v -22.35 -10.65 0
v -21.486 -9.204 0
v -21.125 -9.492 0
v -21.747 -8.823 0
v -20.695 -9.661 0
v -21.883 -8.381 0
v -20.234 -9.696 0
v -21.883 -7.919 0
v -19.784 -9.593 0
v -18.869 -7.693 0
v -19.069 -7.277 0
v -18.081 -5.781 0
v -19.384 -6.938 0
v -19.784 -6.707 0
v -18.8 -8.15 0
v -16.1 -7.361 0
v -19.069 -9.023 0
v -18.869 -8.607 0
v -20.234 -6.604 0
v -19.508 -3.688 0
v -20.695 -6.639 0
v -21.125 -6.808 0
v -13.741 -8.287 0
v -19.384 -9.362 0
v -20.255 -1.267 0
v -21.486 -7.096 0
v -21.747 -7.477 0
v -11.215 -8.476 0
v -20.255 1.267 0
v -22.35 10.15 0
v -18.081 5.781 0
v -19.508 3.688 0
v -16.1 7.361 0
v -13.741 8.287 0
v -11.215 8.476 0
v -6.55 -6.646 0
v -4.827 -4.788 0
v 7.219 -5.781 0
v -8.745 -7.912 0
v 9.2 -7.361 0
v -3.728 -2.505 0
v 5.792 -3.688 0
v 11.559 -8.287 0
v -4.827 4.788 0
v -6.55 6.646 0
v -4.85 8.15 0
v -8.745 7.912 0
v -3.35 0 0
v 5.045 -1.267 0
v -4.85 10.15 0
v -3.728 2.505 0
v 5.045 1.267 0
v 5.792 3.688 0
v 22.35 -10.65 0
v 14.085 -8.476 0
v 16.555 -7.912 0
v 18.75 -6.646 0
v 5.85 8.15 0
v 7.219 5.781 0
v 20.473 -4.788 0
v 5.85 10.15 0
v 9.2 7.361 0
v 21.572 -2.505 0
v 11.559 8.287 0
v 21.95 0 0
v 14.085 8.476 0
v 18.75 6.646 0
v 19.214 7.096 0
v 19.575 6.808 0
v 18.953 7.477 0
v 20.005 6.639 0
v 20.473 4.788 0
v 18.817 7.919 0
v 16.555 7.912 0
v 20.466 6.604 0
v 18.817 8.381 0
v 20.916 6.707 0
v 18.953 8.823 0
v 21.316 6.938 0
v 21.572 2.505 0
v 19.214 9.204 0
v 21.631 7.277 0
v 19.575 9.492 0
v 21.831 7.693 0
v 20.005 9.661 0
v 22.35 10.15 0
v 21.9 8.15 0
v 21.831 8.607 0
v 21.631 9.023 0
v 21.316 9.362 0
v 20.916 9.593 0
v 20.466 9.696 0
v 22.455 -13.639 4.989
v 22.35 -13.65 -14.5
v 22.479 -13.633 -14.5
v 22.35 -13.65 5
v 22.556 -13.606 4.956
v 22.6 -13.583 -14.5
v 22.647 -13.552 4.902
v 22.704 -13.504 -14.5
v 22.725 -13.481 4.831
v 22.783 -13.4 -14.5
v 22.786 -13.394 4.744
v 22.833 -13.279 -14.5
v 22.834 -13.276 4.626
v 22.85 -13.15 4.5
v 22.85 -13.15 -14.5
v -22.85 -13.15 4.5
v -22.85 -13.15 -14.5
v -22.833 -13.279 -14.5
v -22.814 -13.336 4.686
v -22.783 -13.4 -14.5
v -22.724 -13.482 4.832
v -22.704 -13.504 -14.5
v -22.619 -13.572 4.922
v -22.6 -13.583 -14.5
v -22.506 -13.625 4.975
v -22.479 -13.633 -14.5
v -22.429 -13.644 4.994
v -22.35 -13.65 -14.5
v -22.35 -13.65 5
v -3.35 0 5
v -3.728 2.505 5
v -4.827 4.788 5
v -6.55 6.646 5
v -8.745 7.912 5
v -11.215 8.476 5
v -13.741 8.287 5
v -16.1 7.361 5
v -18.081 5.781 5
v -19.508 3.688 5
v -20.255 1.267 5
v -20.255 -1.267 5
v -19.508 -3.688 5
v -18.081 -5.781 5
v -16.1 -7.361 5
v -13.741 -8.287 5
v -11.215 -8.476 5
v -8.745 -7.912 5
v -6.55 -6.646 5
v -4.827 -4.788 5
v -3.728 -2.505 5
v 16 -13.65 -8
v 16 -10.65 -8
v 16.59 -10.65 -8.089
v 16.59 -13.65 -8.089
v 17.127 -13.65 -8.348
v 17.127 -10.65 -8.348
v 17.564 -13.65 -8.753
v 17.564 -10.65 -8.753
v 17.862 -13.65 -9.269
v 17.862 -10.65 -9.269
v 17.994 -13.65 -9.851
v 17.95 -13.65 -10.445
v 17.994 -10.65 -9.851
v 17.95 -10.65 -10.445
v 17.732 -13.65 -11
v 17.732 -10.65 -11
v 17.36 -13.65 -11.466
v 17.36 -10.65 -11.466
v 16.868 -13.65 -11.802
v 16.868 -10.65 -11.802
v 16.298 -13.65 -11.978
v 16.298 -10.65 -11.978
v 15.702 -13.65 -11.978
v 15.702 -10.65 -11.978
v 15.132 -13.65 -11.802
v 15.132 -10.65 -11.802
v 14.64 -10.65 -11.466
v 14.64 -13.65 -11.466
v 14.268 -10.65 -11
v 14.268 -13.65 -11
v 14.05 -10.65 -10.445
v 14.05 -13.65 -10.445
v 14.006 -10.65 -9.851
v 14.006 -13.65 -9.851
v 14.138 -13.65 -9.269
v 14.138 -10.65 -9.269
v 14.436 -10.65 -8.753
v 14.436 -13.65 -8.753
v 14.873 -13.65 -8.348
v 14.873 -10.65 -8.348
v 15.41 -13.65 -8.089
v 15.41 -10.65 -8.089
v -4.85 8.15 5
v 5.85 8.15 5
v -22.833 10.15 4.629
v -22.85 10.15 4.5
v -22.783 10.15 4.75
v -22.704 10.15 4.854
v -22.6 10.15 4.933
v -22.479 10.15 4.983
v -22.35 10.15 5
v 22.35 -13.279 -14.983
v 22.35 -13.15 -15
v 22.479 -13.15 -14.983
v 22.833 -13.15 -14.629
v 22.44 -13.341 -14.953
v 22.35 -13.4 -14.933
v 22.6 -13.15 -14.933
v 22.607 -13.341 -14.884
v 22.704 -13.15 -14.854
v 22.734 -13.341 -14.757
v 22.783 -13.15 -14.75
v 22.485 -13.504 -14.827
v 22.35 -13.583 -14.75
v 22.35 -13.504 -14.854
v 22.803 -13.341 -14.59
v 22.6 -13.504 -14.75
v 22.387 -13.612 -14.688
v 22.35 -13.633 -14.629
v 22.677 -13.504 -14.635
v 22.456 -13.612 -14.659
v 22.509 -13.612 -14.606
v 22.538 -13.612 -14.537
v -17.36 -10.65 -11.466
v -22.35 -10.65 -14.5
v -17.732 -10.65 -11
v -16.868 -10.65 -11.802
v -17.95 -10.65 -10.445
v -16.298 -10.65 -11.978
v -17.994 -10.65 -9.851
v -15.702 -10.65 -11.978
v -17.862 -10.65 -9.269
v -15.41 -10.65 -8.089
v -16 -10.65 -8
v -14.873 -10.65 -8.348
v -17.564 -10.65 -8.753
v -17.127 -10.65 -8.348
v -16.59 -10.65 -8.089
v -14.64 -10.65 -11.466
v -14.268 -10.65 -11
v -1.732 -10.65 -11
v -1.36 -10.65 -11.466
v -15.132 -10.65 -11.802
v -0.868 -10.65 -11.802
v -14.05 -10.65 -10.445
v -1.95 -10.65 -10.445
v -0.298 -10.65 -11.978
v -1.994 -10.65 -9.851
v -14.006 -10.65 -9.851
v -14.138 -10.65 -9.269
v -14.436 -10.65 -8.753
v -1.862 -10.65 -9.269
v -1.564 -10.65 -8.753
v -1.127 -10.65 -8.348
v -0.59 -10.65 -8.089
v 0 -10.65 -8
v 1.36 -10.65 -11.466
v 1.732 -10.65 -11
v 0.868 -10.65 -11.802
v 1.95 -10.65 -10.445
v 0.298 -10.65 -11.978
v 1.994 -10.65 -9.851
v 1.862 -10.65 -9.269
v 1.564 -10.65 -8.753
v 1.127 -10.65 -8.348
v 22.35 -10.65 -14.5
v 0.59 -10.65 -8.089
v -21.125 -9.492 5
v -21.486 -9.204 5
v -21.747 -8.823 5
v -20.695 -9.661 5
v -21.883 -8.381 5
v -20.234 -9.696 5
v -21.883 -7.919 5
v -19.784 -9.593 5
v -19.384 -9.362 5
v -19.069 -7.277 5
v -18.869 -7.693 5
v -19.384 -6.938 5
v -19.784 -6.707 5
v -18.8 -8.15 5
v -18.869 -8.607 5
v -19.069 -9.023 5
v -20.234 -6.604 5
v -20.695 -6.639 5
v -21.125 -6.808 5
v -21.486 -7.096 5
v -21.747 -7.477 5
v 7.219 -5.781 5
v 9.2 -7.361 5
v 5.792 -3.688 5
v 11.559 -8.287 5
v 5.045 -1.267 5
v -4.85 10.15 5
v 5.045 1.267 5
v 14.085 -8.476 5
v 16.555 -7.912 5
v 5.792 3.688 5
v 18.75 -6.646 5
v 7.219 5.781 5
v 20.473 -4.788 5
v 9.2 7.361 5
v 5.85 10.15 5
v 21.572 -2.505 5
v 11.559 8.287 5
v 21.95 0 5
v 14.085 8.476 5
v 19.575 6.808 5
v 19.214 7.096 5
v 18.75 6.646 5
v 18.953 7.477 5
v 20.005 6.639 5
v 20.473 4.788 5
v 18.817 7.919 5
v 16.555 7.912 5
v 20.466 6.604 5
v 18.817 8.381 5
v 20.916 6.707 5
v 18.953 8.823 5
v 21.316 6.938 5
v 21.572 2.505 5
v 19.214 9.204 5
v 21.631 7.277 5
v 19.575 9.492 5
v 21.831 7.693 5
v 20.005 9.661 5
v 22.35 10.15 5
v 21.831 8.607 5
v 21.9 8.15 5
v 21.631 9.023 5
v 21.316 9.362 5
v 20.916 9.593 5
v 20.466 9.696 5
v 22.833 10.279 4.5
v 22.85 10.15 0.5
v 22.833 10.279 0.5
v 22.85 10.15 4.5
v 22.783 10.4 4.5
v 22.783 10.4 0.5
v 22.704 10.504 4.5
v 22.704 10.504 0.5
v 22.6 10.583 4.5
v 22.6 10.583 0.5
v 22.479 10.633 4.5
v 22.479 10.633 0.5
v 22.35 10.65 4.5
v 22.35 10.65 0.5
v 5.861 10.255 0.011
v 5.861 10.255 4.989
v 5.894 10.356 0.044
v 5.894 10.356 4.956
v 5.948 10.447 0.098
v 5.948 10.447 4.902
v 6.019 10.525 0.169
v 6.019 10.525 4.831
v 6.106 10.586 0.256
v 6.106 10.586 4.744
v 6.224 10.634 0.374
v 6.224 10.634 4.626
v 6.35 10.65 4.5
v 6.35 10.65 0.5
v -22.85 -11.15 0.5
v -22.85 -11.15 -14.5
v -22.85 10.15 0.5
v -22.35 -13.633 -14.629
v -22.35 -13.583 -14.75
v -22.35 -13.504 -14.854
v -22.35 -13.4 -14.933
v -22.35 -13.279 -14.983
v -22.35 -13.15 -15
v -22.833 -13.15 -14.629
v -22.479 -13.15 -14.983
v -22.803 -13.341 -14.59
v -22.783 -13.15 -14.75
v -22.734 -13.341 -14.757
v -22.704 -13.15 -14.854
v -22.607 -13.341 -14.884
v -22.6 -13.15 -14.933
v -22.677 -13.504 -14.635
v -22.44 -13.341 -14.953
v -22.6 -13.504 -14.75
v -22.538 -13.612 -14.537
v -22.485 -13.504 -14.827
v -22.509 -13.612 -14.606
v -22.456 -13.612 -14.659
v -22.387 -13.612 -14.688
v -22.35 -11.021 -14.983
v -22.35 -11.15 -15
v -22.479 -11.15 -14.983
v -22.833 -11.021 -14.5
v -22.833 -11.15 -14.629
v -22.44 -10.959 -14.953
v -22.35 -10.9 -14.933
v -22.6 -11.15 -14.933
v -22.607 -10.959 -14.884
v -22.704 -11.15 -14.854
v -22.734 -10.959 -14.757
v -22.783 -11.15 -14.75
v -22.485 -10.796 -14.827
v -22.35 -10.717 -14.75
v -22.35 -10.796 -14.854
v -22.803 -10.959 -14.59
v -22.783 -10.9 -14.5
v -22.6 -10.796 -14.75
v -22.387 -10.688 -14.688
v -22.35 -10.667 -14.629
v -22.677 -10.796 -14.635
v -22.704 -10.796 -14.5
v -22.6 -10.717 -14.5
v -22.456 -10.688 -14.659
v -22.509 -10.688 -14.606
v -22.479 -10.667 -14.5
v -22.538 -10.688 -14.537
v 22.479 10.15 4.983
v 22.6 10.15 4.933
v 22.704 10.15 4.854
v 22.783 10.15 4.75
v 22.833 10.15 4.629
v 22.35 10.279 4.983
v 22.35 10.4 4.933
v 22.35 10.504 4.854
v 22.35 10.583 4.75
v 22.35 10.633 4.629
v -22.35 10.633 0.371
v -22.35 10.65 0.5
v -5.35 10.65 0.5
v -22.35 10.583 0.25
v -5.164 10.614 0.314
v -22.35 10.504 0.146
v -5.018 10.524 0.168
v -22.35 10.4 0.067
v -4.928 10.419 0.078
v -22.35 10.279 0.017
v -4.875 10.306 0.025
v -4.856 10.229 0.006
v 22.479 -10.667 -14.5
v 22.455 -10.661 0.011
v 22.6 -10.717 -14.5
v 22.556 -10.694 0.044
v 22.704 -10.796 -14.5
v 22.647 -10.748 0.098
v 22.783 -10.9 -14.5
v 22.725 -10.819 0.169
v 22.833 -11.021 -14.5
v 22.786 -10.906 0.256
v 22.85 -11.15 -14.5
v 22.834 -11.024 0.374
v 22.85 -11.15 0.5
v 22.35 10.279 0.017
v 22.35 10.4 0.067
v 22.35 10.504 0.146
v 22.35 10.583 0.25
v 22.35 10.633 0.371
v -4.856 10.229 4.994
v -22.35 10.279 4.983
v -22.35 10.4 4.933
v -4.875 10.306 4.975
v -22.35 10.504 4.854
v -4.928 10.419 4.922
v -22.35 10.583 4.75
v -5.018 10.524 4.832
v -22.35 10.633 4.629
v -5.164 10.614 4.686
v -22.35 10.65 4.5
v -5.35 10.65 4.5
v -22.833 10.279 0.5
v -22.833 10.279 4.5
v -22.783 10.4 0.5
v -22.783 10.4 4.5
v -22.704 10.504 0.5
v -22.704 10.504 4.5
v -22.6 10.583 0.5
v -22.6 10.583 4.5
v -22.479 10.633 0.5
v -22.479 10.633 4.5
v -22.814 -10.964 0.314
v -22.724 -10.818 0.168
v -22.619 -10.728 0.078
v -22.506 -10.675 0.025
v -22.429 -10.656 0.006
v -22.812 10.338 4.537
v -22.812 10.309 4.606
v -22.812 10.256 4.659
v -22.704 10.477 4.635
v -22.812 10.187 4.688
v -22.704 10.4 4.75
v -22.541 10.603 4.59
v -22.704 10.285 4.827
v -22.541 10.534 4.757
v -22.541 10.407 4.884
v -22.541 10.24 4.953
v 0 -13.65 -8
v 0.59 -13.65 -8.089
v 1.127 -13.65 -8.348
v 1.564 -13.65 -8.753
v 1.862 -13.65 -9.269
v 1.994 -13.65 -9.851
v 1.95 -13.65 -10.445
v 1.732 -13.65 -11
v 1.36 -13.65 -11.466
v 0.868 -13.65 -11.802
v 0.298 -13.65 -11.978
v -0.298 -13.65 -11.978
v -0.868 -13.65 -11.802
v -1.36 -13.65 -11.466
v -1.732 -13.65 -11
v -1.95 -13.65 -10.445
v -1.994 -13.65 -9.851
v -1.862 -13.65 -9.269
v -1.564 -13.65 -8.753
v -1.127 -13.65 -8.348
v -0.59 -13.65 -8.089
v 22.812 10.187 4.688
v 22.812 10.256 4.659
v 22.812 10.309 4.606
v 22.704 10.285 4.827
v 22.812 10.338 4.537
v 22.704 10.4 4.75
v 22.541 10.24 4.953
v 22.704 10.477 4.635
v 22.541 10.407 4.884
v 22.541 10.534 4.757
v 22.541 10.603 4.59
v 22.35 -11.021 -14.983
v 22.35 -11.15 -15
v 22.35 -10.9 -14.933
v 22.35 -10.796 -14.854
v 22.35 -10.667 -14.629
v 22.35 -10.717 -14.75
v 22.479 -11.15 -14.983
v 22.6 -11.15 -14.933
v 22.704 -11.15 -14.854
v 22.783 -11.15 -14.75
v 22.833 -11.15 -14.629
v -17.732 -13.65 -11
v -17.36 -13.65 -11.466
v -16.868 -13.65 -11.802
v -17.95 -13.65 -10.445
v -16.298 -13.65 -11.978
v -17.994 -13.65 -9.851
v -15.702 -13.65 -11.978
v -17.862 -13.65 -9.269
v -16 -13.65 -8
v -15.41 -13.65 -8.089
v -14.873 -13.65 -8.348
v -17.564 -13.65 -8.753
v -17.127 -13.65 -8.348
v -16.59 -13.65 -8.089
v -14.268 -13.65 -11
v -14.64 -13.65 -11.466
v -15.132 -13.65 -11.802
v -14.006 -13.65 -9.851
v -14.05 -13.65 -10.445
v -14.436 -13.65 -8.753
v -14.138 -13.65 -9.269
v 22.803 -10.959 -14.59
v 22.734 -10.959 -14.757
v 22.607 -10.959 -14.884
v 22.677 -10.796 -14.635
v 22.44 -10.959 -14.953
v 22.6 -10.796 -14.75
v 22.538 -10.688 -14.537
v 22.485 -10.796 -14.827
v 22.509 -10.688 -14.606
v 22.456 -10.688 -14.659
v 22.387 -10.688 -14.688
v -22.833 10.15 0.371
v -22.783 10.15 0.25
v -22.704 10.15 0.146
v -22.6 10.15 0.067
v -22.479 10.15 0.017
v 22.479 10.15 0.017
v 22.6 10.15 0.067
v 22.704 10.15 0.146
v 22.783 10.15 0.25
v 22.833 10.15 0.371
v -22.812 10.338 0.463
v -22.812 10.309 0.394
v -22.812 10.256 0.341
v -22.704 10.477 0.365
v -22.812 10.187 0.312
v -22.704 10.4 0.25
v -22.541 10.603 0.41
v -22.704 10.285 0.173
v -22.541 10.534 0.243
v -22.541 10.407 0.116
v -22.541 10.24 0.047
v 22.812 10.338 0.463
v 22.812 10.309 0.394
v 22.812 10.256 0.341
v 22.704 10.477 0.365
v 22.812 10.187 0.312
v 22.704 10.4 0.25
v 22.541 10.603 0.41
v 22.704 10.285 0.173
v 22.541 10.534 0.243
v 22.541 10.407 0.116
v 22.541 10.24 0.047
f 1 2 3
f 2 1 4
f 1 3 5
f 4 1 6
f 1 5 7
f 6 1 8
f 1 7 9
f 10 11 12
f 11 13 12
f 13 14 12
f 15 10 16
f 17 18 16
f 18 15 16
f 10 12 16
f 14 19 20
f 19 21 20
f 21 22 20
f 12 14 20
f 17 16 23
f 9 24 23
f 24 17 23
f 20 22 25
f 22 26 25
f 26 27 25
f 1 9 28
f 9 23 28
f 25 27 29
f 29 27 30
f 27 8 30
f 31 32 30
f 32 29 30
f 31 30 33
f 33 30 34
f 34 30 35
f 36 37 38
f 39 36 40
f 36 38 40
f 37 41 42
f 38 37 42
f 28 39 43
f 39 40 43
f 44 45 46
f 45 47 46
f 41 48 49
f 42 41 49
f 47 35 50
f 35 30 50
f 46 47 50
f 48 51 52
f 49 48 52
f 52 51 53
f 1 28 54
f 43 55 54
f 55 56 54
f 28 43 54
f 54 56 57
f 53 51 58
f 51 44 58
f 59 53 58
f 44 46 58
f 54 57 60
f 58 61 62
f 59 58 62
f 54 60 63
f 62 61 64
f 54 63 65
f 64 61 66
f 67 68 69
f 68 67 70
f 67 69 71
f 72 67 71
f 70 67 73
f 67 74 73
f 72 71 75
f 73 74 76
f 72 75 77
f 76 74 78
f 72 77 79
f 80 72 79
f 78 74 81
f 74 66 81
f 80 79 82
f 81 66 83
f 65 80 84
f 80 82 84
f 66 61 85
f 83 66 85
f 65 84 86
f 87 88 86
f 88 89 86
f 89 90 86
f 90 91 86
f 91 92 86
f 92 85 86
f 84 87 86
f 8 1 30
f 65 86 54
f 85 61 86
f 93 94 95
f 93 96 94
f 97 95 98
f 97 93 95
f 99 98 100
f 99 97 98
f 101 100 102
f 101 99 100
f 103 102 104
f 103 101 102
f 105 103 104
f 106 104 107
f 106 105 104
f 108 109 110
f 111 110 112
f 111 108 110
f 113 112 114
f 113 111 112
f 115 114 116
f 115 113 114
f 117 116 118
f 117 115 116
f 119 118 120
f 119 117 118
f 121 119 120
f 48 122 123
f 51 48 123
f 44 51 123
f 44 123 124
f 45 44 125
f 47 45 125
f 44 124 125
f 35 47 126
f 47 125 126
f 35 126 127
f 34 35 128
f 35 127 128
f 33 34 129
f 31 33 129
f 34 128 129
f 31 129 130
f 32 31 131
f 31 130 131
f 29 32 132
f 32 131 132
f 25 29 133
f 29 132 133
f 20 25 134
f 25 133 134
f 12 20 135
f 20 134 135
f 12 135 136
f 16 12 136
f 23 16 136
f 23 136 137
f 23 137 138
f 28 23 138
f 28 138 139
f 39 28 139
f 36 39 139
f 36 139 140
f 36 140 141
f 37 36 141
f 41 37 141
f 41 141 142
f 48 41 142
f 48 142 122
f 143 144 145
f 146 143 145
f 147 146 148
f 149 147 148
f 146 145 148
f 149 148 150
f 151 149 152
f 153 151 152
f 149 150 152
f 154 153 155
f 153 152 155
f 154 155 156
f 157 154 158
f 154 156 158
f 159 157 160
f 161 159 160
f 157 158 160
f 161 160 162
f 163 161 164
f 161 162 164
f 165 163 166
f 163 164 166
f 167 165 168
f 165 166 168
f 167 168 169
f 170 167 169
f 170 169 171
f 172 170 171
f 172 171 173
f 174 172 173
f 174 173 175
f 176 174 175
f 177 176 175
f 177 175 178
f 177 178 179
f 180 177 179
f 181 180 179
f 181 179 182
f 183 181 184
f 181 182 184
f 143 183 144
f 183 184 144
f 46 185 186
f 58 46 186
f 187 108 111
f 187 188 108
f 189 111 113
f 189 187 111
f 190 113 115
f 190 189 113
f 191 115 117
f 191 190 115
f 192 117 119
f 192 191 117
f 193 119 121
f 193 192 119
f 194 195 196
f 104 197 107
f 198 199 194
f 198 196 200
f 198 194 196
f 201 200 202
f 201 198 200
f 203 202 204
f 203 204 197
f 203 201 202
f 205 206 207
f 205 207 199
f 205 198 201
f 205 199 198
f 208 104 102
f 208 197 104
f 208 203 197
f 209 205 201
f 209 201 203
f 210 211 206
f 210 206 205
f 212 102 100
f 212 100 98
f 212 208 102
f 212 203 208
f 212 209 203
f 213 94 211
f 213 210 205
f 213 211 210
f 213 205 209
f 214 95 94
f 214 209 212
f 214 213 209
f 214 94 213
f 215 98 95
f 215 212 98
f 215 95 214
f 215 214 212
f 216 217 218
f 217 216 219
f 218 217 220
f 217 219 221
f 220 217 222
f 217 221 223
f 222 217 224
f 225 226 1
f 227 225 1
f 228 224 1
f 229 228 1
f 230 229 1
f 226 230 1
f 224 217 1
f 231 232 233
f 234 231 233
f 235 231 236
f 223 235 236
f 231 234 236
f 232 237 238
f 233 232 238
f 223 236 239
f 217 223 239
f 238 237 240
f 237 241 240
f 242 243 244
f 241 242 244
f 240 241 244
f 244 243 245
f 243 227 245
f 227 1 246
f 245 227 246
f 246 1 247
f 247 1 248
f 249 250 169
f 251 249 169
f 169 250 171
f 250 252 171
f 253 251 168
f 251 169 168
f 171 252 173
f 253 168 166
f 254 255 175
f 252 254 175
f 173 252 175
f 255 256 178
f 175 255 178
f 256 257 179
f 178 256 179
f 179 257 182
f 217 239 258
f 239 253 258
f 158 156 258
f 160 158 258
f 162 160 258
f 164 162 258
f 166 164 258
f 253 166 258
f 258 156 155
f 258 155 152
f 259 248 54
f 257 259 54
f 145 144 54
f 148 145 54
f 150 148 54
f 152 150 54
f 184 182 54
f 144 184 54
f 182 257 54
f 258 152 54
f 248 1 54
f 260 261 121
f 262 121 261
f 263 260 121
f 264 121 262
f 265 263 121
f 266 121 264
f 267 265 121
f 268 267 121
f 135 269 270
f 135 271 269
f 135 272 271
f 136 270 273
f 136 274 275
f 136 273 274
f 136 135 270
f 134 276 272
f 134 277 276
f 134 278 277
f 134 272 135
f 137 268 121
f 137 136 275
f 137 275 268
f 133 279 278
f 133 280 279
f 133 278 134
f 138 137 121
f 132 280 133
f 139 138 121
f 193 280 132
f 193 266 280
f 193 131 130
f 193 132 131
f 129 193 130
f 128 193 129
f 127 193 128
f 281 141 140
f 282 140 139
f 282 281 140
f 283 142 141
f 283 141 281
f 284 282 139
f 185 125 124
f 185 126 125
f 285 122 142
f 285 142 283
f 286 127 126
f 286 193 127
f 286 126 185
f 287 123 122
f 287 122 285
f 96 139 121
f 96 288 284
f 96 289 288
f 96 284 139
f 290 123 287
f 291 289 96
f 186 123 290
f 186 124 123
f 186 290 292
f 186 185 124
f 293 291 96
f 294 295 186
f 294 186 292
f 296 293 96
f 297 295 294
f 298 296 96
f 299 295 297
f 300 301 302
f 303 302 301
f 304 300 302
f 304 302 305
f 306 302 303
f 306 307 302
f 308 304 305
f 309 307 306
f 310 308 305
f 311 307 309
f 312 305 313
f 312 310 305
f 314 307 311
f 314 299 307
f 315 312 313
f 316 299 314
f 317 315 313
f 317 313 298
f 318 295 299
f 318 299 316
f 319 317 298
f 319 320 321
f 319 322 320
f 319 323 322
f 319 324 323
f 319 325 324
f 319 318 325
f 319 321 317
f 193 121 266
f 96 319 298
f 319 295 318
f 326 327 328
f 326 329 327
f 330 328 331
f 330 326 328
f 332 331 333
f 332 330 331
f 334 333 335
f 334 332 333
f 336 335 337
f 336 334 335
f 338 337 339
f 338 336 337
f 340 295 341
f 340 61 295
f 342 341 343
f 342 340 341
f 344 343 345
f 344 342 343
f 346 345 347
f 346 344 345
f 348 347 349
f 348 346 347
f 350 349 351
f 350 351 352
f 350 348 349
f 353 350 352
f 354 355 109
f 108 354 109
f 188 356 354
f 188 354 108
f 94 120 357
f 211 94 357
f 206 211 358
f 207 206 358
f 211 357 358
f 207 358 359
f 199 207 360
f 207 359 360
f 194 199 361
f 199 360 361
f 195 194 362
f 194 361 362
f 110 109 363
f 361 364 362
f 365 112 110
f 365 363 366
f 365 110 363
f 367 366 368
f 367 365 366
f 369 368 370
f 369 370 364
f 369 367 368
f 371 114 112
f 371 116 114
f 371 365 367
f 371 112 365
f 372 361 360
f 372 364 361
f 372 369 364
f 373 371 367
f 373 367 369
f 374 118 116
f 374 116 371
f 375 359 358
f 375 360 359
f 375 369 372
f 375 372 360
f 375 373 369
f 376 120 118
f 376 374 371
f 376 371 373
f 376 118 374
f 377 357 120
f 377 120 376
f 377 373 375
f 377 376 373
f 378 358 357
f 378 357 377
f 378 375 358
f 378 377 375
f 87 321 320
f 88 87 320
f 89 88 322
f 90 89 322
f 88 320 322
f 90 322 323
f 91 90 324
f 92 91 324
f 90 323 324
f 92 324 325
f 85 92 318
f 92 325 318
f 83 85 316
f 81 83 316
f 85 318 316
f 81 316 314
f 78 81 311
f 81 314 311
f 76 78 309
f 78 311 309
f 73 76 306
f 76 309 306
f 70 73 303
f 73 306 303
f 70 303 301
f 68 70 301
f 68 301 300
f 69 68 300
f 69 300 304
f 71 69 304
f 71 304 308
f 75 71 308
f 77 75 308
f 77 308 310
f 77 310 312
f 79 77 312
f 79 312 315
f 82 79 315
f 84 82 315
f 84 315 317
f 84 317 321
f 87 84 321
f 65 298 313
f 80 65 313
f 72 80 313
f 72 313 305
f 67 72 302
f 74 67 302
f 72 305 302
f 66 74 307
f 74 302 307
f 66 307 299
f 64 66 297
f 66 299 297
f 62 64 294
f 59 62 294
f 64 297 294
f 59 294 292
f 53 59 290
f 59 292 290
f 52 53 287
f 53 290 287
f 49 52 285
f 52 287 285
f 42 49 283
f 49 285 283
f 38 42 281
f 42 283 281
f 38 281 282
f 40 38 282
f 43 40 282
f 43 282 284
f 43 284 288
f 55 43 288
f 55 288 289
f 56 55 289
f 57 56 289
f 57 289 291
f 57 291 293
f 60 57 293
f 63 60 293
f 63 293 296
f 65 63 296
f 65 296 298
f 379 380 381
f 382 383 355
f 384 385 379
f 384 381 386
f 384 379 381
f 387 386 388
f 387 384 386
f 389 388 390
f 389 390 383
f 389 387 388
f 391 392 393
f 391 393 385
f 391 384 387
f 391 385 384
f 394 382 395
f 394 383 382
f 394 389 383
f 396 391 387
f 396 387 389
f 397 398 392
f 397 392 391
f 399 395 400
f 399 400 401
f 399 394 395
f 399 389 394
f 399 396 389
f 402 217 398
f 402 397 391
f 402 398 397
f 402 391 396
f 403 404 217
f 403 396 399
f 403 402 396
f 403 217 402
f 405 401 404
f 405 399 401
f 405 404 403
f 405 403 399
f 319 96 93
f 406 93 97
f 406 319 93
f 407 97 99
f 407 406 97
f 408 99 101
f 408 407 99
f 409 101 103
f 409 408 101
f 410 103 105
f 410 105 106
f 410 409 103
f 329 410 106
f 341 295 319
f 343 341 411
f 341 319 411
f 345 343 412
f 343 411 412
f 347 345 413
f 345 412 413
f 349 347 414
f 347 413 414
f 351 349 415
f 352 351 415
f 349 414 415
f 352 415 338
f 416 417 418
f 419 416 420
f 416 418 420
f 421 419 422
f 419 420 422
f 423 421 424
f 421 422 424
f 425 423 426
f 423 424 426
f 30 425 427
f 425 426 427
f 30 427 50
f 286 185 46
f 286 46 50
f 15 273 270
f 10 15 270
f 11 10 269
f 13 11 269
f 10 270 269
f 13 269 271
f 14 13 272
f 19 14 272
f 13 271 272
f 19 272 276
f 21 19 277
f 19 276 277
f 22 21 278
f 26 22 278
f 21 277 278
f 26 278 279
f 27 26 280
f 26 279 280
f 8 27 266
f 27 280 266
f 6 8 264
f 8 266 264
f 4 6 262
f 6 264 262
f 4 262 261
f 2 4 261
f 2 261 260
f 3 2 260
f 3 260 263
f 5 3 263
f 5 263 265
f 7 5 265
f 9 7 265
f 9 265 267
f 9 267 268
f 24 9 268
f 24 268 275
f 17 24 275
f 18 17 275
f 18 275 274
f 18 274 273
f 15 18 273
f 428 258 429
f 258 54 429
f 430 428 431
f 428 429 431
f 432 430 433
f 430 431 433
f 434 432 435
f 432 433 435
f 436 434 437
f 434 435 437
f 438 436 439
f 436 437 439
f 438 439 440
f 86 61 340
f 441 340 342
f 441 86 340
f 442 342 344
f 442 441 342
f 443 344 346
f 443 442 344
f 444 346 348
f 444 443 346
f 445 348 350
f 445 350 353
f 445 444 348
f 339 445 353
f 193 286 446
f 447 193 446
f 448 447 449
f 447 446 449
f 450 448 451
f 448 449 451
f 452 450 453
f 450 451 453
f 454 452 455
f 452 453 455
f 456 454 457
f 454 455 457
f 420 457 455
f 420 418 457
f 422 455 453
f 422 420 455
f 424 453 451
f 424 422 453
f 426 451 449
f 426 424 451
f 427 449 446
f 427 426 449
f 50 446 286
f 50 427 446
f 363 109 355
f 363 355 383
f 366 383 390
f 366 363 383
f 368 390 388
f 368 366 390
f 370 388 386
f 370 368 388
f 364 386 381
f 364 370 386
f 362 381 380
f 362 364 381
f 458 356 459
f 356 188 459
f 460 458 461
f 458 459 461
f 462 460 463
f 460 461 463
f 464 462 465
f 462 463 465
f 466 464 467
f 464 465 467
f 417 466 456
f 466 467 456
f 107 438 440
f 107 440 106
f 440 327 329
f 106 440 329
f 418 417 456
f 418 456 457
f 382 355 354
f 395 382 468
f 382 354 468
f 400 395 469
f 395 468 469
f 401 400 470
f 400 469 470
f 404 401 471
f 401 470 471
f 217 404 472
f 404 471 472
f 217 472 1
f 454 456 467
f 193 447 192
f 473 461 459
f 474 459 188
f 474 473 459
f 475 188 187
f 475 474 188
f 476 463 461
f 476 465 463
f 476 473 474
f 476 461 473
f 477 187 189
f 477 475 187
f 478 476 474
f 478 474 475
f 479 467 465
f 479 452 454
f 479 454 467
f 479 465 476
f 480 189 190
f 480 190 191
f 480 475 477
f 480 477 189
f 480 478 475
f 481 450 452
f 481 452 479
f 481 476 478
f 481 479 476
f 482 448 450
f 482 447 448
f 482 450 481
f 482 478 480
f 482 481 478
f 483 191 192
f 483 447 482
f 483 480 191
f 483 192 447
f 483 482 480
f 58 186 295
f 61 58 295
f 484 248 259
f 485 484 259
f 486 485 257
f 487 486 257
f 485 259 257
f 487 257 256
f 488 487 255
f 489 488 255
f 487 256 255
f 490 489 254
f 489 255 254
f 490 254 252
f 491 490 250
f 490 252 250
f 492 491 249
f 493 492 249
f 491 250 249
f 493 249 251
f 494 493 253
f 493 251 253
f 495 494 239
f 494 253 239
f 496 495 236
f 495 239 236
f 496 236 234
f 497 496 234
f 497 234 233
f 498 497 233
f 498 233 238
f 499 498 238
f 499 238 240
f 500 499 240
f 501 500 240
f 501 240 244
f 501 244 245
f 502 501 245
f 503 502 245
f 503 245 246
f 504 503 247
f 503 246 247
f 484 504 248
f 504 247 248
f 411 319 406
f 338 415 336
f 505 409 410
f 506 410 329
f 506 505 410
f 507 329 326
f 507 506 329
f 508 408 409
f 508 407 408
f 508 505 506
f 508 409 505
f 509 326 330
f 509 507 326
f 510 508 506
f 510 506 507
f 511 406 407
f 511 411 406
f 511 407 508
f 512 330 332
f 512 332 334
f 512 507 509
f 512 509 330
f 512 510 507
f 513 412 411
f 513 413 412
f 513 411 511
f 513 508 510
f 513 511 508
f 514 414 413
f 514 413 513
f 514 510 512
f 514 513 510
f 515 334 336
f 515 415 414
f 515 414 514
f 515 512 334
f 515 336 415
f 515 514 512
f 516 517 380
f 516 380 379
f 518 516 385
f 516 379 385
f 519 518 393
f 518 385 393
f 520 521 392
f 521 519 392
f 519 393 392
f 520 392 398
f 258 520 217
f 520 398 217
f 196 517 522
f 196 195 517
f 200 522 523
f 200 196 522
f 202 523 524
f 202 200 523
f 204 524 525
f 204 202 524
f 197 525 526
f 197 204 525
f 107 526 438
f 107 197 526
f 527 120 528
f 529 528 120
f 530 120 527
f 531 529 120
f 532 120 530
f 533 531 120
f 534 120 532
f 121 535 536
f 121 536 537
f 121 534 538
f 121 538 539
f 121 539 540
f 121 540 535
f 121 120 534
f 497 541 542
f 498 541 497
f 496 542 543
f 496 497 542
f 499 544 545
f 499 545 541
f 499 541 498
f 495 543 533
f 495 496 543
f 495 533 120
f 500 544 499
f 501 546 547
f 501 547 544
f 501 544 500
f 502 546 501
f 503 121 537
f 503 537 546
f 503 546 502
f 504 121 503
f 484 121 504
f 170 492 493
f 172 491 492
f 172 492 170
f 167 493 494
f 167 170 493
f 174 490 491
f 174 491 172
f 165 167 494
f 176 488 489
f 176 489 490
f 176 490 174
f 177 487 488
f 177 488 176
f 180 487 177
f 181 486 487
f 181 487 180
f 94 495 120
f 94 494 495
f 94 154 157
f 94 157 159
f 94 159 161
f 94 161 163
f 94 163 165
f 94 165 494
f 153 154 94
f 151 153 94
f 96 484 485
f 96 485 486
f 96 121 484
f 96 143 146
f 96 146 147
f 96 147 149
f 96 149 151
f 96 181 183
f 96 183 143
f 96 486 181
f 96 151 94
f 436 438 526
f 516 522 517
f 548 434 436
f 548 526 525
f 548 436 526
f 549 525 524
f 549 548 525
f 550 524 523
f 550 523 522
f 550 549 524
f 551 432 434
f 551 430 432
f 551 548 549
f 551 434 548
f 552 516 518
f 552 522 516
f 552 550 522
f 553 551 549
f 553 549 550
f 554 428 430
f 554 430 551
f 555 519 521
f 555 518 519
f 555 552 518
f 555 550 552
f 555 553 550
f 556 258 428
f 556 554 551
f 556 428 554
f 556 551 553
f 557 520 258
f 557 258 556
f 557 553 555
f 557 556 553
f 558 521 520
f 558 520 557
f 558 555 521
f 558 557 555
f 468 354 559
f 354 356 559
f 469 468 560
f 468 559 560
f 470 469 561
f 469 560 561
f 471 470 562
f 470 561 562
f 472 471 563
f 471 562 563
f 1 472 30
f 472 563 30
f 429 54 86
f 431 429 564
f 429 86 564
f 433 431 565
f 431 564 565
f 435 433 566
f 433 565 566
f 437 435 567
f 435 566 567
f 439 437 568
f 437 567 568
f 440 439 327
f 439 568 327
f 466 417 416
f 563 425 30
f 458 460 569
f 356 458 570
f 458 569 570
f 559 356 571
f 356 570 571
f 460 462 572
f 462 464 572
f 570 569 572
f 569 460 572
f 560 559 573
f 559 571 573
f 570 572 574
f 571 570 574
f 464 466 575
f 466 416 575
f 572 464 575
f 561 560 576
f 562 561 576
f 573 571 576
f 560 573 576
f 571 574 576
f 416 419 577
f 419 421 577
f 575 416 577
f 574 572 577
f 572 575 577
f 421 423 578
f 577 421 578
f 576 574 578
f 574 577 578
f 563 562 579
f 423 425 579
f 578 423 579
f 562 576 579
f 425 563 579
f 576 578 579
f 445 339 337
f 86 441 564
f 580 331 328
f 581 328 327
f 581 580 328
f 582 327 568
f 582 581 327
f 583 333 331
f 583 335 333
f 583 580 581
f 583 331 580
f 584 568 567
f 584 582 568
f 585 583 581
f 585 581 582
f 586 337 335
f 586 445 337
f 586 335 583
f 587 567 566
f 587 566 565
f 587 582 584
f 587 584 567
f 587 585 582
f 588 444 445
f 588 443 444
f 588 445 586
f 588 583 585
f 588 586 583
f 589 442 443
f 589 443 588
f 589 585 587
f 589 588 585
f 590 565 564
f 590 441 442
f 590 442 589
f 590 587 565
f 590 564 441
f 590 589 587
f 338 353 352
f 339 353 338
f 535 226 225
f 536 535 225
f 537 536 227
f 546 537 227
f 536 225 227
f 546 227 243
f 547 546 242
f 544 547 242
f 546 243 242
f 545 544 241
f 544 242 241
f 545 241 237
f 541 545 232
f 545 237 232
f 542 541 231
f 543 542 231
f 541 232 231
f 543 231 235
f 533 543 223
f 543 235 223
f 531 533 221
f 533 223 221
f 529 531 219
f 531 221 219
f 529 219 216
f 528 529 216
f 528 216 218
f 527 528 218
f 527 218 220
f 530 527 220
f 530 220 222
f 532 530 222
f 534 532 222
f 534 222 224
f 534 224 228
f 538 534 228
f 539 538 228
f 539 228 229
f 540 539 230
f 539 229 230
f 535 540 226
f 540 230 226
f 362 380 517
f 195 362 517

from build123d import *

# Parameters (mm, degrees)
SKETCH_1_W          = 45.7
SKETCH_1_H          = 21.3
EXTRUDE_1_DEPTH     = 5
SKETCH_2_R          = 1.55
SKETCH_2_R_2        = 8.5
CUT_EXTRUDE_1_DEPTH = 13.95
SKETCH_7_W          = 45.7
SKETCH_7_H          = 20
EXTRUDE_3_DEPTH     = 3
SKETCH_3_W          = 10.7
SKETCH_3_H          = 2.5
CUT_EXTRUDE_2_DEPTH = 13.95
FILLET_4_R          = 0.5
SKETCH_11_R         = 2
CUT_EXTRUDE_4_DEPTH = 3
FILLET_5_R          = 0.5


with BuildPart() as part:
    # 草圖1 → 填料-伸長1 (new body)
    with BuildSketch(Plane.XY):
        Rectangle(SKETCH_1_W, SKETCH_1_H)
    extrude(amount=EXTRUDE_1_DEPTH)

    # 草圖2 → 除料-伸長1 (cut)
    with BuildSketch(Plane.XY.offset(5)):
        with Locations((-20.35, -8.15)):
            Circle(SKETCH_2_R)
        with Locations((20.35, 8.15)):
            Circle(SKETCH_2_R)
        with Locations((-11.85, 0)):
            Circle(SKETCH_2_R_2)
        with Locations((13.45, 0)):
            Circle(SKETCH_2_R_2)
    extrude(amount=-CUT_EXTRUDE_1_DEPTH, mode=Mode.SUBTRACT)

    # 草圖7 → 填料-伸長3 (add)
    with BuildSketch(Plane.XZ.offset(10.65)):
        with Locations((0, -5)):
            Rectangle(SKETCH_7_W, SKETCH_7_H)
    extrude(amount=EXTRUDE_3_DEPTH)

    # 草圖3 → 除料-伸長2 (cut)
    with BuildSketch(Plane.XY.offset(5)):
        with Locations((0.5, 9.4)):
            Rectangle(SKETCH_3_W, SKETCH_3_H)
    extrude(amount=-CUT_EXTRUDE_2_DEPTH, mode=Mode.SUBTRACT)

    # 圓角4
    fillet_4_edges = [part.edges().sort_by_distance(p)[0] for p in [
        (14.35, 10.65, 5),
        (5.85, 10.65, 2.5),
        (14.35, 10.65, 0),
        (-13.85, 10.65, 0),
        (-4.85, 10.65, 2.5),
        (-13.85, 10.65, 5),
        (-22.85, 10.65, 2.5),
        (-22.85, -1.5, 5),
        (-22.85, -13.65, -5),
        (-22.85, -12.15, -15),
        (-22.85, -10.65, -7.5),
        (-22.85, 0, 0),
        (22.85, -10.65, -7.5),
        (22.85, -12.15, -15),
        (22.85, -13.65, -5),
        (22.85, -1.5, 5),
        (22.85, 10.65, 2.5),
        (22.85, 0, 0),
    ]]
    fillet(fillet_4_edges, radius=FILLET_4_R)

    # 草圖11 → 除料-伸長4 (cut)
    with BuildSketch(Plane(origin=(0, -10.65, 0), x_dir=(1, 0, 0), z_dir=(0, 1, 0))):
        with Locations(Location((0, 10, 0), (0, 0, 270))):
            Circle(SKETCH_11_R)
        with Locations(Location((16, 10, 0), (0, 0, 270))):
            Circle(SKETCH_11_R)
        with Locations(Location((-16, 10, 0), (0, 0, 270))):
            Circle(SKETCH_11_R)
    extrude(amount=-CUT_EXTRUDE_4_DEPTH, mode=Mode.SUBTRACT)

    # 圓角5
    # the kernel refuses this fillet: 0.5 mm, written as the material it takes off along each edge
    with BuildSketch(Plane(origin=(-22.35, -13.15, -14.5), x_dir=(0, 0, -1), z_dir=(0, -1, 0))) as fillet_5_piece_1_section:
        Polygon((0, 0), (FILLET_5_R, 0), (FILLET_5_R, -FILLET_5_R), (0, -FILLET_5_R), align=None)
    fillet_5_piece_1 = extrude(amount=FILLET_5_R, mode=Mode.PRIVATE)
    fillet_5_piece_1 = fillet_5_piece_1 - Plane(origin=(-22.35, -13.15, -14.5), x_dir=(0.7071067811865475, 0, 0.7071067811865475), z_dir=(0, -1, 0)) * Sphere(FILLET_5_R, mode=Mode.PRIVATE)
    add(fillet_5_piece_1, mode=Mode.SUBTRACT)
    with BuildSketch(Plane(origin=(-22.35, -11.15, -14.5), x_dir=(0, 0, -1), z_dir=(0, 1, 0))) as fillet_5_piece_2_section:
        Polygon((0, 0), (FILLET_5_R, 0), (FILLET_5_R, FILLET_5_R), (0, FILLET_5_R), align=None)
    fillet_5_piece_2 = extrude(amount=FILLET_5_R, mode=Mode.PRIVATE)
    fillet_5_piece_2 = fillet_5_piece_2 - Plane(origin=(-22.35, -11.15, -14.5), x_dir=(0.7071067811865475, 0, 0.7071067811865475), z_dir=(0, 1, 0)) * Sphere(FILLET_5_R, mode=Mode.PRIVATE)
    add(fillet_5_piece_2, mode=Mode.SUBTRACT)
    with BuildSketch(Plane(origin=(22.35, -11.15, -14.5), x_dir=(0, 0, -1), z_dir=(0, 1, 0))) as fillet_5_piece_3_section:
        Polygon((0, 0), (FILLET_5_R, 0), (FILLET_5_R, -FILLET_5_R), (0, -FILLET_5_R), align=None)
    fillet_5_piece_3 = extrude(amount=FILLET_5_R, mode=Mode.PRIVATE)
    fillet_5_piece_3 = fillet_5_piece_3 - Plane(origin=(22.35, -11.15, -14.5), x_dir=(-0.7071067811865475, 0, 0.7071067811865475), z_dir=(0, 1, 0)) * Sphere(FILLET_5_R, mode=Mode.PRIVATE)
    add(fillet_5_piece_3, mode=Mode.SUBTRACT)
    with BuildSketch(Plane(origin=(22.35, -13.15, -14.5), x_dir=(0, 0, -1), z_dir=(0, -1, 0))) as fillet_5_piece_4_section:
        Polygon((0, 0), (FILLET_5_R, 0), (FILLET_5_R, FILLET_5_R), (0, FILLET_5_R), align=None)
    fillet_5_piece_4 = extrude(amount=FILLET_5_R, mode=Mode.PRIVATE)
    fillet_5_piece_4 = fillet_5_piece_4 - Plane(origin=(22.35, -13.15, -14.5), x_dir=(-0.7071067811865475, 0, 0.7071067811865475), z_dir=(0, -1, 0)) * Sphere(FILLET_5_R, mode=Mode.PRIVATE)
    add(fillet_5_piece_4, mode=Mode.SUBTRACT)
    with BuildSketch(Plane(origin=(-22.35, -13.65, -15), x_dir=(0, 0, 1), z_dir=(1, 0, 0))) as fillet_5_piece_5:
        with BuildLine():
            CenterArc((FILLET_5_R, -FILLET_5_R), FILLET_5_R, 90, 90)
            Line((0, -FILLET_5_R), (0, 0))
            Line((0, 0), (FILLET_5_R, 0))
        make_face()
    extrude(amount=44.7, mode=Mode.SUBTRACT)
    with BuildSketch(Plane(origin=(-22.35, -10.65, -15), x_dir=(0, 0, 1), z_dir=(1, 0, 0))) as fillet_5_piece_6:
        with BuildLine():
            CenterArc((FILLET_5_R, FILLET_5_R), FILLET_5_R, 180, 90)
            Line((0, FILLET_5_R), (0, 0))
            Line((0, 0), (FILLET_5_R, 0))
        make_face()
    extrude(amount=44.7, mode=Mode.SUBTRACT)


solid = part.part
